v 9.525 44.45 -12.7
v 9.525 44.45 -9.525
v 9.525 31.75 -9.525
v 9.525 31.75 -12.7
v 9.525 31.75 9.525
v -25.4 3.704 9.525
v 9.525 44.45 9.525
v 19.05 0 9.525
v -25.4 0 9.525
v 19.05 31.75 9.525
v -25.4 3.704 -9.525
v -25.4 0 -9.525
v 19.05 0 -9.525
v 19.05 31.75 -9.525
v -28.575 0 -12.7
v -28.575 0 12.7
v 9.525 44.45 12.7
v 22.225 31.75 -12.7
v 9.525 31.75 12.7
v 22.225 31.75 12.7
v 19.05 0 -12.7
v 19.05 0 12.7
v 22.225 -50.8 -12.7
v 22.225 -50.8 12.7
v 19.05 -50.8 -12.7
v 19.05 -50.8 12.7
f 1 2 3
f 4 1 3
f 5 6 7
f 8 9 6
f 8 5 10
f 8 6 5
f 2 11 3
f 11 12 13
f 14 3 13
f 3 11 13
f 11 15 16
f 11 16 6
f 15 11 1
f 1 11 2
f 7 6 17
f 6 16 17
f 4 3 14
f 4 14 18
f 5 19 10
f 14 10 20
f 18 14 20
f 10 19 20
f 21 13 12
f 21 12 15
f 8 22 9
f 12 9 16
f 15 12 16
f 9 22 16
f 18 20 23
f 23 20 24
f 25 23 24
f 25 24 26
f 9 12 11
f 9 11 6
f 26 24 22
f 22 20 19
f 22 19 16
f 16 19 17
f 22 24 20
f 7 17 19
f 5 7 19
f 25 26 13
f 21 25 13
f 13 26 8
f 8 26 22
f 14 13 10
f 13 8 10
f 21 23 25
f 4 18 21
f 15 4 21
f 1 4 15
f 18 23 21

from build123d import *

# Parameters (mm, degrees)
BOSS_EXTRUDE1_DEPTH = 12.7
SKETCH2_W           = 44.45
SKETCH2_H           = 19.05
CUT_EXTRUDE1_DEPTH  = 60.652834174


with BuildPart() as part:
    # Sketch1 → Boss-Extrude1 (new, symmetric)
    with BuildSketch(Plane.XY):
        Polygon((19.05, -50.8), (19.05, 0), (-28.575, 0), (9.525, 44.45), (9.525, 31.75), (22.225, 31.75), (22.225, -50.8), align=None)
    extrude(amount=BOSS_EXTRUDE1_DEPTH, both=True)

    # Sketch2 → Cut-Extrude1 (cut, through all)
    with BuildSketch(Plane.XZ):
        with Locations((-3.175, 0)):
            Rectangle(SKETCH2_W, SKETCH2_H)
    extrude(amount=-CUT_EXTRUDE1_DEPTH, mode=Mode.SUBTRACT)


solid = part.part
